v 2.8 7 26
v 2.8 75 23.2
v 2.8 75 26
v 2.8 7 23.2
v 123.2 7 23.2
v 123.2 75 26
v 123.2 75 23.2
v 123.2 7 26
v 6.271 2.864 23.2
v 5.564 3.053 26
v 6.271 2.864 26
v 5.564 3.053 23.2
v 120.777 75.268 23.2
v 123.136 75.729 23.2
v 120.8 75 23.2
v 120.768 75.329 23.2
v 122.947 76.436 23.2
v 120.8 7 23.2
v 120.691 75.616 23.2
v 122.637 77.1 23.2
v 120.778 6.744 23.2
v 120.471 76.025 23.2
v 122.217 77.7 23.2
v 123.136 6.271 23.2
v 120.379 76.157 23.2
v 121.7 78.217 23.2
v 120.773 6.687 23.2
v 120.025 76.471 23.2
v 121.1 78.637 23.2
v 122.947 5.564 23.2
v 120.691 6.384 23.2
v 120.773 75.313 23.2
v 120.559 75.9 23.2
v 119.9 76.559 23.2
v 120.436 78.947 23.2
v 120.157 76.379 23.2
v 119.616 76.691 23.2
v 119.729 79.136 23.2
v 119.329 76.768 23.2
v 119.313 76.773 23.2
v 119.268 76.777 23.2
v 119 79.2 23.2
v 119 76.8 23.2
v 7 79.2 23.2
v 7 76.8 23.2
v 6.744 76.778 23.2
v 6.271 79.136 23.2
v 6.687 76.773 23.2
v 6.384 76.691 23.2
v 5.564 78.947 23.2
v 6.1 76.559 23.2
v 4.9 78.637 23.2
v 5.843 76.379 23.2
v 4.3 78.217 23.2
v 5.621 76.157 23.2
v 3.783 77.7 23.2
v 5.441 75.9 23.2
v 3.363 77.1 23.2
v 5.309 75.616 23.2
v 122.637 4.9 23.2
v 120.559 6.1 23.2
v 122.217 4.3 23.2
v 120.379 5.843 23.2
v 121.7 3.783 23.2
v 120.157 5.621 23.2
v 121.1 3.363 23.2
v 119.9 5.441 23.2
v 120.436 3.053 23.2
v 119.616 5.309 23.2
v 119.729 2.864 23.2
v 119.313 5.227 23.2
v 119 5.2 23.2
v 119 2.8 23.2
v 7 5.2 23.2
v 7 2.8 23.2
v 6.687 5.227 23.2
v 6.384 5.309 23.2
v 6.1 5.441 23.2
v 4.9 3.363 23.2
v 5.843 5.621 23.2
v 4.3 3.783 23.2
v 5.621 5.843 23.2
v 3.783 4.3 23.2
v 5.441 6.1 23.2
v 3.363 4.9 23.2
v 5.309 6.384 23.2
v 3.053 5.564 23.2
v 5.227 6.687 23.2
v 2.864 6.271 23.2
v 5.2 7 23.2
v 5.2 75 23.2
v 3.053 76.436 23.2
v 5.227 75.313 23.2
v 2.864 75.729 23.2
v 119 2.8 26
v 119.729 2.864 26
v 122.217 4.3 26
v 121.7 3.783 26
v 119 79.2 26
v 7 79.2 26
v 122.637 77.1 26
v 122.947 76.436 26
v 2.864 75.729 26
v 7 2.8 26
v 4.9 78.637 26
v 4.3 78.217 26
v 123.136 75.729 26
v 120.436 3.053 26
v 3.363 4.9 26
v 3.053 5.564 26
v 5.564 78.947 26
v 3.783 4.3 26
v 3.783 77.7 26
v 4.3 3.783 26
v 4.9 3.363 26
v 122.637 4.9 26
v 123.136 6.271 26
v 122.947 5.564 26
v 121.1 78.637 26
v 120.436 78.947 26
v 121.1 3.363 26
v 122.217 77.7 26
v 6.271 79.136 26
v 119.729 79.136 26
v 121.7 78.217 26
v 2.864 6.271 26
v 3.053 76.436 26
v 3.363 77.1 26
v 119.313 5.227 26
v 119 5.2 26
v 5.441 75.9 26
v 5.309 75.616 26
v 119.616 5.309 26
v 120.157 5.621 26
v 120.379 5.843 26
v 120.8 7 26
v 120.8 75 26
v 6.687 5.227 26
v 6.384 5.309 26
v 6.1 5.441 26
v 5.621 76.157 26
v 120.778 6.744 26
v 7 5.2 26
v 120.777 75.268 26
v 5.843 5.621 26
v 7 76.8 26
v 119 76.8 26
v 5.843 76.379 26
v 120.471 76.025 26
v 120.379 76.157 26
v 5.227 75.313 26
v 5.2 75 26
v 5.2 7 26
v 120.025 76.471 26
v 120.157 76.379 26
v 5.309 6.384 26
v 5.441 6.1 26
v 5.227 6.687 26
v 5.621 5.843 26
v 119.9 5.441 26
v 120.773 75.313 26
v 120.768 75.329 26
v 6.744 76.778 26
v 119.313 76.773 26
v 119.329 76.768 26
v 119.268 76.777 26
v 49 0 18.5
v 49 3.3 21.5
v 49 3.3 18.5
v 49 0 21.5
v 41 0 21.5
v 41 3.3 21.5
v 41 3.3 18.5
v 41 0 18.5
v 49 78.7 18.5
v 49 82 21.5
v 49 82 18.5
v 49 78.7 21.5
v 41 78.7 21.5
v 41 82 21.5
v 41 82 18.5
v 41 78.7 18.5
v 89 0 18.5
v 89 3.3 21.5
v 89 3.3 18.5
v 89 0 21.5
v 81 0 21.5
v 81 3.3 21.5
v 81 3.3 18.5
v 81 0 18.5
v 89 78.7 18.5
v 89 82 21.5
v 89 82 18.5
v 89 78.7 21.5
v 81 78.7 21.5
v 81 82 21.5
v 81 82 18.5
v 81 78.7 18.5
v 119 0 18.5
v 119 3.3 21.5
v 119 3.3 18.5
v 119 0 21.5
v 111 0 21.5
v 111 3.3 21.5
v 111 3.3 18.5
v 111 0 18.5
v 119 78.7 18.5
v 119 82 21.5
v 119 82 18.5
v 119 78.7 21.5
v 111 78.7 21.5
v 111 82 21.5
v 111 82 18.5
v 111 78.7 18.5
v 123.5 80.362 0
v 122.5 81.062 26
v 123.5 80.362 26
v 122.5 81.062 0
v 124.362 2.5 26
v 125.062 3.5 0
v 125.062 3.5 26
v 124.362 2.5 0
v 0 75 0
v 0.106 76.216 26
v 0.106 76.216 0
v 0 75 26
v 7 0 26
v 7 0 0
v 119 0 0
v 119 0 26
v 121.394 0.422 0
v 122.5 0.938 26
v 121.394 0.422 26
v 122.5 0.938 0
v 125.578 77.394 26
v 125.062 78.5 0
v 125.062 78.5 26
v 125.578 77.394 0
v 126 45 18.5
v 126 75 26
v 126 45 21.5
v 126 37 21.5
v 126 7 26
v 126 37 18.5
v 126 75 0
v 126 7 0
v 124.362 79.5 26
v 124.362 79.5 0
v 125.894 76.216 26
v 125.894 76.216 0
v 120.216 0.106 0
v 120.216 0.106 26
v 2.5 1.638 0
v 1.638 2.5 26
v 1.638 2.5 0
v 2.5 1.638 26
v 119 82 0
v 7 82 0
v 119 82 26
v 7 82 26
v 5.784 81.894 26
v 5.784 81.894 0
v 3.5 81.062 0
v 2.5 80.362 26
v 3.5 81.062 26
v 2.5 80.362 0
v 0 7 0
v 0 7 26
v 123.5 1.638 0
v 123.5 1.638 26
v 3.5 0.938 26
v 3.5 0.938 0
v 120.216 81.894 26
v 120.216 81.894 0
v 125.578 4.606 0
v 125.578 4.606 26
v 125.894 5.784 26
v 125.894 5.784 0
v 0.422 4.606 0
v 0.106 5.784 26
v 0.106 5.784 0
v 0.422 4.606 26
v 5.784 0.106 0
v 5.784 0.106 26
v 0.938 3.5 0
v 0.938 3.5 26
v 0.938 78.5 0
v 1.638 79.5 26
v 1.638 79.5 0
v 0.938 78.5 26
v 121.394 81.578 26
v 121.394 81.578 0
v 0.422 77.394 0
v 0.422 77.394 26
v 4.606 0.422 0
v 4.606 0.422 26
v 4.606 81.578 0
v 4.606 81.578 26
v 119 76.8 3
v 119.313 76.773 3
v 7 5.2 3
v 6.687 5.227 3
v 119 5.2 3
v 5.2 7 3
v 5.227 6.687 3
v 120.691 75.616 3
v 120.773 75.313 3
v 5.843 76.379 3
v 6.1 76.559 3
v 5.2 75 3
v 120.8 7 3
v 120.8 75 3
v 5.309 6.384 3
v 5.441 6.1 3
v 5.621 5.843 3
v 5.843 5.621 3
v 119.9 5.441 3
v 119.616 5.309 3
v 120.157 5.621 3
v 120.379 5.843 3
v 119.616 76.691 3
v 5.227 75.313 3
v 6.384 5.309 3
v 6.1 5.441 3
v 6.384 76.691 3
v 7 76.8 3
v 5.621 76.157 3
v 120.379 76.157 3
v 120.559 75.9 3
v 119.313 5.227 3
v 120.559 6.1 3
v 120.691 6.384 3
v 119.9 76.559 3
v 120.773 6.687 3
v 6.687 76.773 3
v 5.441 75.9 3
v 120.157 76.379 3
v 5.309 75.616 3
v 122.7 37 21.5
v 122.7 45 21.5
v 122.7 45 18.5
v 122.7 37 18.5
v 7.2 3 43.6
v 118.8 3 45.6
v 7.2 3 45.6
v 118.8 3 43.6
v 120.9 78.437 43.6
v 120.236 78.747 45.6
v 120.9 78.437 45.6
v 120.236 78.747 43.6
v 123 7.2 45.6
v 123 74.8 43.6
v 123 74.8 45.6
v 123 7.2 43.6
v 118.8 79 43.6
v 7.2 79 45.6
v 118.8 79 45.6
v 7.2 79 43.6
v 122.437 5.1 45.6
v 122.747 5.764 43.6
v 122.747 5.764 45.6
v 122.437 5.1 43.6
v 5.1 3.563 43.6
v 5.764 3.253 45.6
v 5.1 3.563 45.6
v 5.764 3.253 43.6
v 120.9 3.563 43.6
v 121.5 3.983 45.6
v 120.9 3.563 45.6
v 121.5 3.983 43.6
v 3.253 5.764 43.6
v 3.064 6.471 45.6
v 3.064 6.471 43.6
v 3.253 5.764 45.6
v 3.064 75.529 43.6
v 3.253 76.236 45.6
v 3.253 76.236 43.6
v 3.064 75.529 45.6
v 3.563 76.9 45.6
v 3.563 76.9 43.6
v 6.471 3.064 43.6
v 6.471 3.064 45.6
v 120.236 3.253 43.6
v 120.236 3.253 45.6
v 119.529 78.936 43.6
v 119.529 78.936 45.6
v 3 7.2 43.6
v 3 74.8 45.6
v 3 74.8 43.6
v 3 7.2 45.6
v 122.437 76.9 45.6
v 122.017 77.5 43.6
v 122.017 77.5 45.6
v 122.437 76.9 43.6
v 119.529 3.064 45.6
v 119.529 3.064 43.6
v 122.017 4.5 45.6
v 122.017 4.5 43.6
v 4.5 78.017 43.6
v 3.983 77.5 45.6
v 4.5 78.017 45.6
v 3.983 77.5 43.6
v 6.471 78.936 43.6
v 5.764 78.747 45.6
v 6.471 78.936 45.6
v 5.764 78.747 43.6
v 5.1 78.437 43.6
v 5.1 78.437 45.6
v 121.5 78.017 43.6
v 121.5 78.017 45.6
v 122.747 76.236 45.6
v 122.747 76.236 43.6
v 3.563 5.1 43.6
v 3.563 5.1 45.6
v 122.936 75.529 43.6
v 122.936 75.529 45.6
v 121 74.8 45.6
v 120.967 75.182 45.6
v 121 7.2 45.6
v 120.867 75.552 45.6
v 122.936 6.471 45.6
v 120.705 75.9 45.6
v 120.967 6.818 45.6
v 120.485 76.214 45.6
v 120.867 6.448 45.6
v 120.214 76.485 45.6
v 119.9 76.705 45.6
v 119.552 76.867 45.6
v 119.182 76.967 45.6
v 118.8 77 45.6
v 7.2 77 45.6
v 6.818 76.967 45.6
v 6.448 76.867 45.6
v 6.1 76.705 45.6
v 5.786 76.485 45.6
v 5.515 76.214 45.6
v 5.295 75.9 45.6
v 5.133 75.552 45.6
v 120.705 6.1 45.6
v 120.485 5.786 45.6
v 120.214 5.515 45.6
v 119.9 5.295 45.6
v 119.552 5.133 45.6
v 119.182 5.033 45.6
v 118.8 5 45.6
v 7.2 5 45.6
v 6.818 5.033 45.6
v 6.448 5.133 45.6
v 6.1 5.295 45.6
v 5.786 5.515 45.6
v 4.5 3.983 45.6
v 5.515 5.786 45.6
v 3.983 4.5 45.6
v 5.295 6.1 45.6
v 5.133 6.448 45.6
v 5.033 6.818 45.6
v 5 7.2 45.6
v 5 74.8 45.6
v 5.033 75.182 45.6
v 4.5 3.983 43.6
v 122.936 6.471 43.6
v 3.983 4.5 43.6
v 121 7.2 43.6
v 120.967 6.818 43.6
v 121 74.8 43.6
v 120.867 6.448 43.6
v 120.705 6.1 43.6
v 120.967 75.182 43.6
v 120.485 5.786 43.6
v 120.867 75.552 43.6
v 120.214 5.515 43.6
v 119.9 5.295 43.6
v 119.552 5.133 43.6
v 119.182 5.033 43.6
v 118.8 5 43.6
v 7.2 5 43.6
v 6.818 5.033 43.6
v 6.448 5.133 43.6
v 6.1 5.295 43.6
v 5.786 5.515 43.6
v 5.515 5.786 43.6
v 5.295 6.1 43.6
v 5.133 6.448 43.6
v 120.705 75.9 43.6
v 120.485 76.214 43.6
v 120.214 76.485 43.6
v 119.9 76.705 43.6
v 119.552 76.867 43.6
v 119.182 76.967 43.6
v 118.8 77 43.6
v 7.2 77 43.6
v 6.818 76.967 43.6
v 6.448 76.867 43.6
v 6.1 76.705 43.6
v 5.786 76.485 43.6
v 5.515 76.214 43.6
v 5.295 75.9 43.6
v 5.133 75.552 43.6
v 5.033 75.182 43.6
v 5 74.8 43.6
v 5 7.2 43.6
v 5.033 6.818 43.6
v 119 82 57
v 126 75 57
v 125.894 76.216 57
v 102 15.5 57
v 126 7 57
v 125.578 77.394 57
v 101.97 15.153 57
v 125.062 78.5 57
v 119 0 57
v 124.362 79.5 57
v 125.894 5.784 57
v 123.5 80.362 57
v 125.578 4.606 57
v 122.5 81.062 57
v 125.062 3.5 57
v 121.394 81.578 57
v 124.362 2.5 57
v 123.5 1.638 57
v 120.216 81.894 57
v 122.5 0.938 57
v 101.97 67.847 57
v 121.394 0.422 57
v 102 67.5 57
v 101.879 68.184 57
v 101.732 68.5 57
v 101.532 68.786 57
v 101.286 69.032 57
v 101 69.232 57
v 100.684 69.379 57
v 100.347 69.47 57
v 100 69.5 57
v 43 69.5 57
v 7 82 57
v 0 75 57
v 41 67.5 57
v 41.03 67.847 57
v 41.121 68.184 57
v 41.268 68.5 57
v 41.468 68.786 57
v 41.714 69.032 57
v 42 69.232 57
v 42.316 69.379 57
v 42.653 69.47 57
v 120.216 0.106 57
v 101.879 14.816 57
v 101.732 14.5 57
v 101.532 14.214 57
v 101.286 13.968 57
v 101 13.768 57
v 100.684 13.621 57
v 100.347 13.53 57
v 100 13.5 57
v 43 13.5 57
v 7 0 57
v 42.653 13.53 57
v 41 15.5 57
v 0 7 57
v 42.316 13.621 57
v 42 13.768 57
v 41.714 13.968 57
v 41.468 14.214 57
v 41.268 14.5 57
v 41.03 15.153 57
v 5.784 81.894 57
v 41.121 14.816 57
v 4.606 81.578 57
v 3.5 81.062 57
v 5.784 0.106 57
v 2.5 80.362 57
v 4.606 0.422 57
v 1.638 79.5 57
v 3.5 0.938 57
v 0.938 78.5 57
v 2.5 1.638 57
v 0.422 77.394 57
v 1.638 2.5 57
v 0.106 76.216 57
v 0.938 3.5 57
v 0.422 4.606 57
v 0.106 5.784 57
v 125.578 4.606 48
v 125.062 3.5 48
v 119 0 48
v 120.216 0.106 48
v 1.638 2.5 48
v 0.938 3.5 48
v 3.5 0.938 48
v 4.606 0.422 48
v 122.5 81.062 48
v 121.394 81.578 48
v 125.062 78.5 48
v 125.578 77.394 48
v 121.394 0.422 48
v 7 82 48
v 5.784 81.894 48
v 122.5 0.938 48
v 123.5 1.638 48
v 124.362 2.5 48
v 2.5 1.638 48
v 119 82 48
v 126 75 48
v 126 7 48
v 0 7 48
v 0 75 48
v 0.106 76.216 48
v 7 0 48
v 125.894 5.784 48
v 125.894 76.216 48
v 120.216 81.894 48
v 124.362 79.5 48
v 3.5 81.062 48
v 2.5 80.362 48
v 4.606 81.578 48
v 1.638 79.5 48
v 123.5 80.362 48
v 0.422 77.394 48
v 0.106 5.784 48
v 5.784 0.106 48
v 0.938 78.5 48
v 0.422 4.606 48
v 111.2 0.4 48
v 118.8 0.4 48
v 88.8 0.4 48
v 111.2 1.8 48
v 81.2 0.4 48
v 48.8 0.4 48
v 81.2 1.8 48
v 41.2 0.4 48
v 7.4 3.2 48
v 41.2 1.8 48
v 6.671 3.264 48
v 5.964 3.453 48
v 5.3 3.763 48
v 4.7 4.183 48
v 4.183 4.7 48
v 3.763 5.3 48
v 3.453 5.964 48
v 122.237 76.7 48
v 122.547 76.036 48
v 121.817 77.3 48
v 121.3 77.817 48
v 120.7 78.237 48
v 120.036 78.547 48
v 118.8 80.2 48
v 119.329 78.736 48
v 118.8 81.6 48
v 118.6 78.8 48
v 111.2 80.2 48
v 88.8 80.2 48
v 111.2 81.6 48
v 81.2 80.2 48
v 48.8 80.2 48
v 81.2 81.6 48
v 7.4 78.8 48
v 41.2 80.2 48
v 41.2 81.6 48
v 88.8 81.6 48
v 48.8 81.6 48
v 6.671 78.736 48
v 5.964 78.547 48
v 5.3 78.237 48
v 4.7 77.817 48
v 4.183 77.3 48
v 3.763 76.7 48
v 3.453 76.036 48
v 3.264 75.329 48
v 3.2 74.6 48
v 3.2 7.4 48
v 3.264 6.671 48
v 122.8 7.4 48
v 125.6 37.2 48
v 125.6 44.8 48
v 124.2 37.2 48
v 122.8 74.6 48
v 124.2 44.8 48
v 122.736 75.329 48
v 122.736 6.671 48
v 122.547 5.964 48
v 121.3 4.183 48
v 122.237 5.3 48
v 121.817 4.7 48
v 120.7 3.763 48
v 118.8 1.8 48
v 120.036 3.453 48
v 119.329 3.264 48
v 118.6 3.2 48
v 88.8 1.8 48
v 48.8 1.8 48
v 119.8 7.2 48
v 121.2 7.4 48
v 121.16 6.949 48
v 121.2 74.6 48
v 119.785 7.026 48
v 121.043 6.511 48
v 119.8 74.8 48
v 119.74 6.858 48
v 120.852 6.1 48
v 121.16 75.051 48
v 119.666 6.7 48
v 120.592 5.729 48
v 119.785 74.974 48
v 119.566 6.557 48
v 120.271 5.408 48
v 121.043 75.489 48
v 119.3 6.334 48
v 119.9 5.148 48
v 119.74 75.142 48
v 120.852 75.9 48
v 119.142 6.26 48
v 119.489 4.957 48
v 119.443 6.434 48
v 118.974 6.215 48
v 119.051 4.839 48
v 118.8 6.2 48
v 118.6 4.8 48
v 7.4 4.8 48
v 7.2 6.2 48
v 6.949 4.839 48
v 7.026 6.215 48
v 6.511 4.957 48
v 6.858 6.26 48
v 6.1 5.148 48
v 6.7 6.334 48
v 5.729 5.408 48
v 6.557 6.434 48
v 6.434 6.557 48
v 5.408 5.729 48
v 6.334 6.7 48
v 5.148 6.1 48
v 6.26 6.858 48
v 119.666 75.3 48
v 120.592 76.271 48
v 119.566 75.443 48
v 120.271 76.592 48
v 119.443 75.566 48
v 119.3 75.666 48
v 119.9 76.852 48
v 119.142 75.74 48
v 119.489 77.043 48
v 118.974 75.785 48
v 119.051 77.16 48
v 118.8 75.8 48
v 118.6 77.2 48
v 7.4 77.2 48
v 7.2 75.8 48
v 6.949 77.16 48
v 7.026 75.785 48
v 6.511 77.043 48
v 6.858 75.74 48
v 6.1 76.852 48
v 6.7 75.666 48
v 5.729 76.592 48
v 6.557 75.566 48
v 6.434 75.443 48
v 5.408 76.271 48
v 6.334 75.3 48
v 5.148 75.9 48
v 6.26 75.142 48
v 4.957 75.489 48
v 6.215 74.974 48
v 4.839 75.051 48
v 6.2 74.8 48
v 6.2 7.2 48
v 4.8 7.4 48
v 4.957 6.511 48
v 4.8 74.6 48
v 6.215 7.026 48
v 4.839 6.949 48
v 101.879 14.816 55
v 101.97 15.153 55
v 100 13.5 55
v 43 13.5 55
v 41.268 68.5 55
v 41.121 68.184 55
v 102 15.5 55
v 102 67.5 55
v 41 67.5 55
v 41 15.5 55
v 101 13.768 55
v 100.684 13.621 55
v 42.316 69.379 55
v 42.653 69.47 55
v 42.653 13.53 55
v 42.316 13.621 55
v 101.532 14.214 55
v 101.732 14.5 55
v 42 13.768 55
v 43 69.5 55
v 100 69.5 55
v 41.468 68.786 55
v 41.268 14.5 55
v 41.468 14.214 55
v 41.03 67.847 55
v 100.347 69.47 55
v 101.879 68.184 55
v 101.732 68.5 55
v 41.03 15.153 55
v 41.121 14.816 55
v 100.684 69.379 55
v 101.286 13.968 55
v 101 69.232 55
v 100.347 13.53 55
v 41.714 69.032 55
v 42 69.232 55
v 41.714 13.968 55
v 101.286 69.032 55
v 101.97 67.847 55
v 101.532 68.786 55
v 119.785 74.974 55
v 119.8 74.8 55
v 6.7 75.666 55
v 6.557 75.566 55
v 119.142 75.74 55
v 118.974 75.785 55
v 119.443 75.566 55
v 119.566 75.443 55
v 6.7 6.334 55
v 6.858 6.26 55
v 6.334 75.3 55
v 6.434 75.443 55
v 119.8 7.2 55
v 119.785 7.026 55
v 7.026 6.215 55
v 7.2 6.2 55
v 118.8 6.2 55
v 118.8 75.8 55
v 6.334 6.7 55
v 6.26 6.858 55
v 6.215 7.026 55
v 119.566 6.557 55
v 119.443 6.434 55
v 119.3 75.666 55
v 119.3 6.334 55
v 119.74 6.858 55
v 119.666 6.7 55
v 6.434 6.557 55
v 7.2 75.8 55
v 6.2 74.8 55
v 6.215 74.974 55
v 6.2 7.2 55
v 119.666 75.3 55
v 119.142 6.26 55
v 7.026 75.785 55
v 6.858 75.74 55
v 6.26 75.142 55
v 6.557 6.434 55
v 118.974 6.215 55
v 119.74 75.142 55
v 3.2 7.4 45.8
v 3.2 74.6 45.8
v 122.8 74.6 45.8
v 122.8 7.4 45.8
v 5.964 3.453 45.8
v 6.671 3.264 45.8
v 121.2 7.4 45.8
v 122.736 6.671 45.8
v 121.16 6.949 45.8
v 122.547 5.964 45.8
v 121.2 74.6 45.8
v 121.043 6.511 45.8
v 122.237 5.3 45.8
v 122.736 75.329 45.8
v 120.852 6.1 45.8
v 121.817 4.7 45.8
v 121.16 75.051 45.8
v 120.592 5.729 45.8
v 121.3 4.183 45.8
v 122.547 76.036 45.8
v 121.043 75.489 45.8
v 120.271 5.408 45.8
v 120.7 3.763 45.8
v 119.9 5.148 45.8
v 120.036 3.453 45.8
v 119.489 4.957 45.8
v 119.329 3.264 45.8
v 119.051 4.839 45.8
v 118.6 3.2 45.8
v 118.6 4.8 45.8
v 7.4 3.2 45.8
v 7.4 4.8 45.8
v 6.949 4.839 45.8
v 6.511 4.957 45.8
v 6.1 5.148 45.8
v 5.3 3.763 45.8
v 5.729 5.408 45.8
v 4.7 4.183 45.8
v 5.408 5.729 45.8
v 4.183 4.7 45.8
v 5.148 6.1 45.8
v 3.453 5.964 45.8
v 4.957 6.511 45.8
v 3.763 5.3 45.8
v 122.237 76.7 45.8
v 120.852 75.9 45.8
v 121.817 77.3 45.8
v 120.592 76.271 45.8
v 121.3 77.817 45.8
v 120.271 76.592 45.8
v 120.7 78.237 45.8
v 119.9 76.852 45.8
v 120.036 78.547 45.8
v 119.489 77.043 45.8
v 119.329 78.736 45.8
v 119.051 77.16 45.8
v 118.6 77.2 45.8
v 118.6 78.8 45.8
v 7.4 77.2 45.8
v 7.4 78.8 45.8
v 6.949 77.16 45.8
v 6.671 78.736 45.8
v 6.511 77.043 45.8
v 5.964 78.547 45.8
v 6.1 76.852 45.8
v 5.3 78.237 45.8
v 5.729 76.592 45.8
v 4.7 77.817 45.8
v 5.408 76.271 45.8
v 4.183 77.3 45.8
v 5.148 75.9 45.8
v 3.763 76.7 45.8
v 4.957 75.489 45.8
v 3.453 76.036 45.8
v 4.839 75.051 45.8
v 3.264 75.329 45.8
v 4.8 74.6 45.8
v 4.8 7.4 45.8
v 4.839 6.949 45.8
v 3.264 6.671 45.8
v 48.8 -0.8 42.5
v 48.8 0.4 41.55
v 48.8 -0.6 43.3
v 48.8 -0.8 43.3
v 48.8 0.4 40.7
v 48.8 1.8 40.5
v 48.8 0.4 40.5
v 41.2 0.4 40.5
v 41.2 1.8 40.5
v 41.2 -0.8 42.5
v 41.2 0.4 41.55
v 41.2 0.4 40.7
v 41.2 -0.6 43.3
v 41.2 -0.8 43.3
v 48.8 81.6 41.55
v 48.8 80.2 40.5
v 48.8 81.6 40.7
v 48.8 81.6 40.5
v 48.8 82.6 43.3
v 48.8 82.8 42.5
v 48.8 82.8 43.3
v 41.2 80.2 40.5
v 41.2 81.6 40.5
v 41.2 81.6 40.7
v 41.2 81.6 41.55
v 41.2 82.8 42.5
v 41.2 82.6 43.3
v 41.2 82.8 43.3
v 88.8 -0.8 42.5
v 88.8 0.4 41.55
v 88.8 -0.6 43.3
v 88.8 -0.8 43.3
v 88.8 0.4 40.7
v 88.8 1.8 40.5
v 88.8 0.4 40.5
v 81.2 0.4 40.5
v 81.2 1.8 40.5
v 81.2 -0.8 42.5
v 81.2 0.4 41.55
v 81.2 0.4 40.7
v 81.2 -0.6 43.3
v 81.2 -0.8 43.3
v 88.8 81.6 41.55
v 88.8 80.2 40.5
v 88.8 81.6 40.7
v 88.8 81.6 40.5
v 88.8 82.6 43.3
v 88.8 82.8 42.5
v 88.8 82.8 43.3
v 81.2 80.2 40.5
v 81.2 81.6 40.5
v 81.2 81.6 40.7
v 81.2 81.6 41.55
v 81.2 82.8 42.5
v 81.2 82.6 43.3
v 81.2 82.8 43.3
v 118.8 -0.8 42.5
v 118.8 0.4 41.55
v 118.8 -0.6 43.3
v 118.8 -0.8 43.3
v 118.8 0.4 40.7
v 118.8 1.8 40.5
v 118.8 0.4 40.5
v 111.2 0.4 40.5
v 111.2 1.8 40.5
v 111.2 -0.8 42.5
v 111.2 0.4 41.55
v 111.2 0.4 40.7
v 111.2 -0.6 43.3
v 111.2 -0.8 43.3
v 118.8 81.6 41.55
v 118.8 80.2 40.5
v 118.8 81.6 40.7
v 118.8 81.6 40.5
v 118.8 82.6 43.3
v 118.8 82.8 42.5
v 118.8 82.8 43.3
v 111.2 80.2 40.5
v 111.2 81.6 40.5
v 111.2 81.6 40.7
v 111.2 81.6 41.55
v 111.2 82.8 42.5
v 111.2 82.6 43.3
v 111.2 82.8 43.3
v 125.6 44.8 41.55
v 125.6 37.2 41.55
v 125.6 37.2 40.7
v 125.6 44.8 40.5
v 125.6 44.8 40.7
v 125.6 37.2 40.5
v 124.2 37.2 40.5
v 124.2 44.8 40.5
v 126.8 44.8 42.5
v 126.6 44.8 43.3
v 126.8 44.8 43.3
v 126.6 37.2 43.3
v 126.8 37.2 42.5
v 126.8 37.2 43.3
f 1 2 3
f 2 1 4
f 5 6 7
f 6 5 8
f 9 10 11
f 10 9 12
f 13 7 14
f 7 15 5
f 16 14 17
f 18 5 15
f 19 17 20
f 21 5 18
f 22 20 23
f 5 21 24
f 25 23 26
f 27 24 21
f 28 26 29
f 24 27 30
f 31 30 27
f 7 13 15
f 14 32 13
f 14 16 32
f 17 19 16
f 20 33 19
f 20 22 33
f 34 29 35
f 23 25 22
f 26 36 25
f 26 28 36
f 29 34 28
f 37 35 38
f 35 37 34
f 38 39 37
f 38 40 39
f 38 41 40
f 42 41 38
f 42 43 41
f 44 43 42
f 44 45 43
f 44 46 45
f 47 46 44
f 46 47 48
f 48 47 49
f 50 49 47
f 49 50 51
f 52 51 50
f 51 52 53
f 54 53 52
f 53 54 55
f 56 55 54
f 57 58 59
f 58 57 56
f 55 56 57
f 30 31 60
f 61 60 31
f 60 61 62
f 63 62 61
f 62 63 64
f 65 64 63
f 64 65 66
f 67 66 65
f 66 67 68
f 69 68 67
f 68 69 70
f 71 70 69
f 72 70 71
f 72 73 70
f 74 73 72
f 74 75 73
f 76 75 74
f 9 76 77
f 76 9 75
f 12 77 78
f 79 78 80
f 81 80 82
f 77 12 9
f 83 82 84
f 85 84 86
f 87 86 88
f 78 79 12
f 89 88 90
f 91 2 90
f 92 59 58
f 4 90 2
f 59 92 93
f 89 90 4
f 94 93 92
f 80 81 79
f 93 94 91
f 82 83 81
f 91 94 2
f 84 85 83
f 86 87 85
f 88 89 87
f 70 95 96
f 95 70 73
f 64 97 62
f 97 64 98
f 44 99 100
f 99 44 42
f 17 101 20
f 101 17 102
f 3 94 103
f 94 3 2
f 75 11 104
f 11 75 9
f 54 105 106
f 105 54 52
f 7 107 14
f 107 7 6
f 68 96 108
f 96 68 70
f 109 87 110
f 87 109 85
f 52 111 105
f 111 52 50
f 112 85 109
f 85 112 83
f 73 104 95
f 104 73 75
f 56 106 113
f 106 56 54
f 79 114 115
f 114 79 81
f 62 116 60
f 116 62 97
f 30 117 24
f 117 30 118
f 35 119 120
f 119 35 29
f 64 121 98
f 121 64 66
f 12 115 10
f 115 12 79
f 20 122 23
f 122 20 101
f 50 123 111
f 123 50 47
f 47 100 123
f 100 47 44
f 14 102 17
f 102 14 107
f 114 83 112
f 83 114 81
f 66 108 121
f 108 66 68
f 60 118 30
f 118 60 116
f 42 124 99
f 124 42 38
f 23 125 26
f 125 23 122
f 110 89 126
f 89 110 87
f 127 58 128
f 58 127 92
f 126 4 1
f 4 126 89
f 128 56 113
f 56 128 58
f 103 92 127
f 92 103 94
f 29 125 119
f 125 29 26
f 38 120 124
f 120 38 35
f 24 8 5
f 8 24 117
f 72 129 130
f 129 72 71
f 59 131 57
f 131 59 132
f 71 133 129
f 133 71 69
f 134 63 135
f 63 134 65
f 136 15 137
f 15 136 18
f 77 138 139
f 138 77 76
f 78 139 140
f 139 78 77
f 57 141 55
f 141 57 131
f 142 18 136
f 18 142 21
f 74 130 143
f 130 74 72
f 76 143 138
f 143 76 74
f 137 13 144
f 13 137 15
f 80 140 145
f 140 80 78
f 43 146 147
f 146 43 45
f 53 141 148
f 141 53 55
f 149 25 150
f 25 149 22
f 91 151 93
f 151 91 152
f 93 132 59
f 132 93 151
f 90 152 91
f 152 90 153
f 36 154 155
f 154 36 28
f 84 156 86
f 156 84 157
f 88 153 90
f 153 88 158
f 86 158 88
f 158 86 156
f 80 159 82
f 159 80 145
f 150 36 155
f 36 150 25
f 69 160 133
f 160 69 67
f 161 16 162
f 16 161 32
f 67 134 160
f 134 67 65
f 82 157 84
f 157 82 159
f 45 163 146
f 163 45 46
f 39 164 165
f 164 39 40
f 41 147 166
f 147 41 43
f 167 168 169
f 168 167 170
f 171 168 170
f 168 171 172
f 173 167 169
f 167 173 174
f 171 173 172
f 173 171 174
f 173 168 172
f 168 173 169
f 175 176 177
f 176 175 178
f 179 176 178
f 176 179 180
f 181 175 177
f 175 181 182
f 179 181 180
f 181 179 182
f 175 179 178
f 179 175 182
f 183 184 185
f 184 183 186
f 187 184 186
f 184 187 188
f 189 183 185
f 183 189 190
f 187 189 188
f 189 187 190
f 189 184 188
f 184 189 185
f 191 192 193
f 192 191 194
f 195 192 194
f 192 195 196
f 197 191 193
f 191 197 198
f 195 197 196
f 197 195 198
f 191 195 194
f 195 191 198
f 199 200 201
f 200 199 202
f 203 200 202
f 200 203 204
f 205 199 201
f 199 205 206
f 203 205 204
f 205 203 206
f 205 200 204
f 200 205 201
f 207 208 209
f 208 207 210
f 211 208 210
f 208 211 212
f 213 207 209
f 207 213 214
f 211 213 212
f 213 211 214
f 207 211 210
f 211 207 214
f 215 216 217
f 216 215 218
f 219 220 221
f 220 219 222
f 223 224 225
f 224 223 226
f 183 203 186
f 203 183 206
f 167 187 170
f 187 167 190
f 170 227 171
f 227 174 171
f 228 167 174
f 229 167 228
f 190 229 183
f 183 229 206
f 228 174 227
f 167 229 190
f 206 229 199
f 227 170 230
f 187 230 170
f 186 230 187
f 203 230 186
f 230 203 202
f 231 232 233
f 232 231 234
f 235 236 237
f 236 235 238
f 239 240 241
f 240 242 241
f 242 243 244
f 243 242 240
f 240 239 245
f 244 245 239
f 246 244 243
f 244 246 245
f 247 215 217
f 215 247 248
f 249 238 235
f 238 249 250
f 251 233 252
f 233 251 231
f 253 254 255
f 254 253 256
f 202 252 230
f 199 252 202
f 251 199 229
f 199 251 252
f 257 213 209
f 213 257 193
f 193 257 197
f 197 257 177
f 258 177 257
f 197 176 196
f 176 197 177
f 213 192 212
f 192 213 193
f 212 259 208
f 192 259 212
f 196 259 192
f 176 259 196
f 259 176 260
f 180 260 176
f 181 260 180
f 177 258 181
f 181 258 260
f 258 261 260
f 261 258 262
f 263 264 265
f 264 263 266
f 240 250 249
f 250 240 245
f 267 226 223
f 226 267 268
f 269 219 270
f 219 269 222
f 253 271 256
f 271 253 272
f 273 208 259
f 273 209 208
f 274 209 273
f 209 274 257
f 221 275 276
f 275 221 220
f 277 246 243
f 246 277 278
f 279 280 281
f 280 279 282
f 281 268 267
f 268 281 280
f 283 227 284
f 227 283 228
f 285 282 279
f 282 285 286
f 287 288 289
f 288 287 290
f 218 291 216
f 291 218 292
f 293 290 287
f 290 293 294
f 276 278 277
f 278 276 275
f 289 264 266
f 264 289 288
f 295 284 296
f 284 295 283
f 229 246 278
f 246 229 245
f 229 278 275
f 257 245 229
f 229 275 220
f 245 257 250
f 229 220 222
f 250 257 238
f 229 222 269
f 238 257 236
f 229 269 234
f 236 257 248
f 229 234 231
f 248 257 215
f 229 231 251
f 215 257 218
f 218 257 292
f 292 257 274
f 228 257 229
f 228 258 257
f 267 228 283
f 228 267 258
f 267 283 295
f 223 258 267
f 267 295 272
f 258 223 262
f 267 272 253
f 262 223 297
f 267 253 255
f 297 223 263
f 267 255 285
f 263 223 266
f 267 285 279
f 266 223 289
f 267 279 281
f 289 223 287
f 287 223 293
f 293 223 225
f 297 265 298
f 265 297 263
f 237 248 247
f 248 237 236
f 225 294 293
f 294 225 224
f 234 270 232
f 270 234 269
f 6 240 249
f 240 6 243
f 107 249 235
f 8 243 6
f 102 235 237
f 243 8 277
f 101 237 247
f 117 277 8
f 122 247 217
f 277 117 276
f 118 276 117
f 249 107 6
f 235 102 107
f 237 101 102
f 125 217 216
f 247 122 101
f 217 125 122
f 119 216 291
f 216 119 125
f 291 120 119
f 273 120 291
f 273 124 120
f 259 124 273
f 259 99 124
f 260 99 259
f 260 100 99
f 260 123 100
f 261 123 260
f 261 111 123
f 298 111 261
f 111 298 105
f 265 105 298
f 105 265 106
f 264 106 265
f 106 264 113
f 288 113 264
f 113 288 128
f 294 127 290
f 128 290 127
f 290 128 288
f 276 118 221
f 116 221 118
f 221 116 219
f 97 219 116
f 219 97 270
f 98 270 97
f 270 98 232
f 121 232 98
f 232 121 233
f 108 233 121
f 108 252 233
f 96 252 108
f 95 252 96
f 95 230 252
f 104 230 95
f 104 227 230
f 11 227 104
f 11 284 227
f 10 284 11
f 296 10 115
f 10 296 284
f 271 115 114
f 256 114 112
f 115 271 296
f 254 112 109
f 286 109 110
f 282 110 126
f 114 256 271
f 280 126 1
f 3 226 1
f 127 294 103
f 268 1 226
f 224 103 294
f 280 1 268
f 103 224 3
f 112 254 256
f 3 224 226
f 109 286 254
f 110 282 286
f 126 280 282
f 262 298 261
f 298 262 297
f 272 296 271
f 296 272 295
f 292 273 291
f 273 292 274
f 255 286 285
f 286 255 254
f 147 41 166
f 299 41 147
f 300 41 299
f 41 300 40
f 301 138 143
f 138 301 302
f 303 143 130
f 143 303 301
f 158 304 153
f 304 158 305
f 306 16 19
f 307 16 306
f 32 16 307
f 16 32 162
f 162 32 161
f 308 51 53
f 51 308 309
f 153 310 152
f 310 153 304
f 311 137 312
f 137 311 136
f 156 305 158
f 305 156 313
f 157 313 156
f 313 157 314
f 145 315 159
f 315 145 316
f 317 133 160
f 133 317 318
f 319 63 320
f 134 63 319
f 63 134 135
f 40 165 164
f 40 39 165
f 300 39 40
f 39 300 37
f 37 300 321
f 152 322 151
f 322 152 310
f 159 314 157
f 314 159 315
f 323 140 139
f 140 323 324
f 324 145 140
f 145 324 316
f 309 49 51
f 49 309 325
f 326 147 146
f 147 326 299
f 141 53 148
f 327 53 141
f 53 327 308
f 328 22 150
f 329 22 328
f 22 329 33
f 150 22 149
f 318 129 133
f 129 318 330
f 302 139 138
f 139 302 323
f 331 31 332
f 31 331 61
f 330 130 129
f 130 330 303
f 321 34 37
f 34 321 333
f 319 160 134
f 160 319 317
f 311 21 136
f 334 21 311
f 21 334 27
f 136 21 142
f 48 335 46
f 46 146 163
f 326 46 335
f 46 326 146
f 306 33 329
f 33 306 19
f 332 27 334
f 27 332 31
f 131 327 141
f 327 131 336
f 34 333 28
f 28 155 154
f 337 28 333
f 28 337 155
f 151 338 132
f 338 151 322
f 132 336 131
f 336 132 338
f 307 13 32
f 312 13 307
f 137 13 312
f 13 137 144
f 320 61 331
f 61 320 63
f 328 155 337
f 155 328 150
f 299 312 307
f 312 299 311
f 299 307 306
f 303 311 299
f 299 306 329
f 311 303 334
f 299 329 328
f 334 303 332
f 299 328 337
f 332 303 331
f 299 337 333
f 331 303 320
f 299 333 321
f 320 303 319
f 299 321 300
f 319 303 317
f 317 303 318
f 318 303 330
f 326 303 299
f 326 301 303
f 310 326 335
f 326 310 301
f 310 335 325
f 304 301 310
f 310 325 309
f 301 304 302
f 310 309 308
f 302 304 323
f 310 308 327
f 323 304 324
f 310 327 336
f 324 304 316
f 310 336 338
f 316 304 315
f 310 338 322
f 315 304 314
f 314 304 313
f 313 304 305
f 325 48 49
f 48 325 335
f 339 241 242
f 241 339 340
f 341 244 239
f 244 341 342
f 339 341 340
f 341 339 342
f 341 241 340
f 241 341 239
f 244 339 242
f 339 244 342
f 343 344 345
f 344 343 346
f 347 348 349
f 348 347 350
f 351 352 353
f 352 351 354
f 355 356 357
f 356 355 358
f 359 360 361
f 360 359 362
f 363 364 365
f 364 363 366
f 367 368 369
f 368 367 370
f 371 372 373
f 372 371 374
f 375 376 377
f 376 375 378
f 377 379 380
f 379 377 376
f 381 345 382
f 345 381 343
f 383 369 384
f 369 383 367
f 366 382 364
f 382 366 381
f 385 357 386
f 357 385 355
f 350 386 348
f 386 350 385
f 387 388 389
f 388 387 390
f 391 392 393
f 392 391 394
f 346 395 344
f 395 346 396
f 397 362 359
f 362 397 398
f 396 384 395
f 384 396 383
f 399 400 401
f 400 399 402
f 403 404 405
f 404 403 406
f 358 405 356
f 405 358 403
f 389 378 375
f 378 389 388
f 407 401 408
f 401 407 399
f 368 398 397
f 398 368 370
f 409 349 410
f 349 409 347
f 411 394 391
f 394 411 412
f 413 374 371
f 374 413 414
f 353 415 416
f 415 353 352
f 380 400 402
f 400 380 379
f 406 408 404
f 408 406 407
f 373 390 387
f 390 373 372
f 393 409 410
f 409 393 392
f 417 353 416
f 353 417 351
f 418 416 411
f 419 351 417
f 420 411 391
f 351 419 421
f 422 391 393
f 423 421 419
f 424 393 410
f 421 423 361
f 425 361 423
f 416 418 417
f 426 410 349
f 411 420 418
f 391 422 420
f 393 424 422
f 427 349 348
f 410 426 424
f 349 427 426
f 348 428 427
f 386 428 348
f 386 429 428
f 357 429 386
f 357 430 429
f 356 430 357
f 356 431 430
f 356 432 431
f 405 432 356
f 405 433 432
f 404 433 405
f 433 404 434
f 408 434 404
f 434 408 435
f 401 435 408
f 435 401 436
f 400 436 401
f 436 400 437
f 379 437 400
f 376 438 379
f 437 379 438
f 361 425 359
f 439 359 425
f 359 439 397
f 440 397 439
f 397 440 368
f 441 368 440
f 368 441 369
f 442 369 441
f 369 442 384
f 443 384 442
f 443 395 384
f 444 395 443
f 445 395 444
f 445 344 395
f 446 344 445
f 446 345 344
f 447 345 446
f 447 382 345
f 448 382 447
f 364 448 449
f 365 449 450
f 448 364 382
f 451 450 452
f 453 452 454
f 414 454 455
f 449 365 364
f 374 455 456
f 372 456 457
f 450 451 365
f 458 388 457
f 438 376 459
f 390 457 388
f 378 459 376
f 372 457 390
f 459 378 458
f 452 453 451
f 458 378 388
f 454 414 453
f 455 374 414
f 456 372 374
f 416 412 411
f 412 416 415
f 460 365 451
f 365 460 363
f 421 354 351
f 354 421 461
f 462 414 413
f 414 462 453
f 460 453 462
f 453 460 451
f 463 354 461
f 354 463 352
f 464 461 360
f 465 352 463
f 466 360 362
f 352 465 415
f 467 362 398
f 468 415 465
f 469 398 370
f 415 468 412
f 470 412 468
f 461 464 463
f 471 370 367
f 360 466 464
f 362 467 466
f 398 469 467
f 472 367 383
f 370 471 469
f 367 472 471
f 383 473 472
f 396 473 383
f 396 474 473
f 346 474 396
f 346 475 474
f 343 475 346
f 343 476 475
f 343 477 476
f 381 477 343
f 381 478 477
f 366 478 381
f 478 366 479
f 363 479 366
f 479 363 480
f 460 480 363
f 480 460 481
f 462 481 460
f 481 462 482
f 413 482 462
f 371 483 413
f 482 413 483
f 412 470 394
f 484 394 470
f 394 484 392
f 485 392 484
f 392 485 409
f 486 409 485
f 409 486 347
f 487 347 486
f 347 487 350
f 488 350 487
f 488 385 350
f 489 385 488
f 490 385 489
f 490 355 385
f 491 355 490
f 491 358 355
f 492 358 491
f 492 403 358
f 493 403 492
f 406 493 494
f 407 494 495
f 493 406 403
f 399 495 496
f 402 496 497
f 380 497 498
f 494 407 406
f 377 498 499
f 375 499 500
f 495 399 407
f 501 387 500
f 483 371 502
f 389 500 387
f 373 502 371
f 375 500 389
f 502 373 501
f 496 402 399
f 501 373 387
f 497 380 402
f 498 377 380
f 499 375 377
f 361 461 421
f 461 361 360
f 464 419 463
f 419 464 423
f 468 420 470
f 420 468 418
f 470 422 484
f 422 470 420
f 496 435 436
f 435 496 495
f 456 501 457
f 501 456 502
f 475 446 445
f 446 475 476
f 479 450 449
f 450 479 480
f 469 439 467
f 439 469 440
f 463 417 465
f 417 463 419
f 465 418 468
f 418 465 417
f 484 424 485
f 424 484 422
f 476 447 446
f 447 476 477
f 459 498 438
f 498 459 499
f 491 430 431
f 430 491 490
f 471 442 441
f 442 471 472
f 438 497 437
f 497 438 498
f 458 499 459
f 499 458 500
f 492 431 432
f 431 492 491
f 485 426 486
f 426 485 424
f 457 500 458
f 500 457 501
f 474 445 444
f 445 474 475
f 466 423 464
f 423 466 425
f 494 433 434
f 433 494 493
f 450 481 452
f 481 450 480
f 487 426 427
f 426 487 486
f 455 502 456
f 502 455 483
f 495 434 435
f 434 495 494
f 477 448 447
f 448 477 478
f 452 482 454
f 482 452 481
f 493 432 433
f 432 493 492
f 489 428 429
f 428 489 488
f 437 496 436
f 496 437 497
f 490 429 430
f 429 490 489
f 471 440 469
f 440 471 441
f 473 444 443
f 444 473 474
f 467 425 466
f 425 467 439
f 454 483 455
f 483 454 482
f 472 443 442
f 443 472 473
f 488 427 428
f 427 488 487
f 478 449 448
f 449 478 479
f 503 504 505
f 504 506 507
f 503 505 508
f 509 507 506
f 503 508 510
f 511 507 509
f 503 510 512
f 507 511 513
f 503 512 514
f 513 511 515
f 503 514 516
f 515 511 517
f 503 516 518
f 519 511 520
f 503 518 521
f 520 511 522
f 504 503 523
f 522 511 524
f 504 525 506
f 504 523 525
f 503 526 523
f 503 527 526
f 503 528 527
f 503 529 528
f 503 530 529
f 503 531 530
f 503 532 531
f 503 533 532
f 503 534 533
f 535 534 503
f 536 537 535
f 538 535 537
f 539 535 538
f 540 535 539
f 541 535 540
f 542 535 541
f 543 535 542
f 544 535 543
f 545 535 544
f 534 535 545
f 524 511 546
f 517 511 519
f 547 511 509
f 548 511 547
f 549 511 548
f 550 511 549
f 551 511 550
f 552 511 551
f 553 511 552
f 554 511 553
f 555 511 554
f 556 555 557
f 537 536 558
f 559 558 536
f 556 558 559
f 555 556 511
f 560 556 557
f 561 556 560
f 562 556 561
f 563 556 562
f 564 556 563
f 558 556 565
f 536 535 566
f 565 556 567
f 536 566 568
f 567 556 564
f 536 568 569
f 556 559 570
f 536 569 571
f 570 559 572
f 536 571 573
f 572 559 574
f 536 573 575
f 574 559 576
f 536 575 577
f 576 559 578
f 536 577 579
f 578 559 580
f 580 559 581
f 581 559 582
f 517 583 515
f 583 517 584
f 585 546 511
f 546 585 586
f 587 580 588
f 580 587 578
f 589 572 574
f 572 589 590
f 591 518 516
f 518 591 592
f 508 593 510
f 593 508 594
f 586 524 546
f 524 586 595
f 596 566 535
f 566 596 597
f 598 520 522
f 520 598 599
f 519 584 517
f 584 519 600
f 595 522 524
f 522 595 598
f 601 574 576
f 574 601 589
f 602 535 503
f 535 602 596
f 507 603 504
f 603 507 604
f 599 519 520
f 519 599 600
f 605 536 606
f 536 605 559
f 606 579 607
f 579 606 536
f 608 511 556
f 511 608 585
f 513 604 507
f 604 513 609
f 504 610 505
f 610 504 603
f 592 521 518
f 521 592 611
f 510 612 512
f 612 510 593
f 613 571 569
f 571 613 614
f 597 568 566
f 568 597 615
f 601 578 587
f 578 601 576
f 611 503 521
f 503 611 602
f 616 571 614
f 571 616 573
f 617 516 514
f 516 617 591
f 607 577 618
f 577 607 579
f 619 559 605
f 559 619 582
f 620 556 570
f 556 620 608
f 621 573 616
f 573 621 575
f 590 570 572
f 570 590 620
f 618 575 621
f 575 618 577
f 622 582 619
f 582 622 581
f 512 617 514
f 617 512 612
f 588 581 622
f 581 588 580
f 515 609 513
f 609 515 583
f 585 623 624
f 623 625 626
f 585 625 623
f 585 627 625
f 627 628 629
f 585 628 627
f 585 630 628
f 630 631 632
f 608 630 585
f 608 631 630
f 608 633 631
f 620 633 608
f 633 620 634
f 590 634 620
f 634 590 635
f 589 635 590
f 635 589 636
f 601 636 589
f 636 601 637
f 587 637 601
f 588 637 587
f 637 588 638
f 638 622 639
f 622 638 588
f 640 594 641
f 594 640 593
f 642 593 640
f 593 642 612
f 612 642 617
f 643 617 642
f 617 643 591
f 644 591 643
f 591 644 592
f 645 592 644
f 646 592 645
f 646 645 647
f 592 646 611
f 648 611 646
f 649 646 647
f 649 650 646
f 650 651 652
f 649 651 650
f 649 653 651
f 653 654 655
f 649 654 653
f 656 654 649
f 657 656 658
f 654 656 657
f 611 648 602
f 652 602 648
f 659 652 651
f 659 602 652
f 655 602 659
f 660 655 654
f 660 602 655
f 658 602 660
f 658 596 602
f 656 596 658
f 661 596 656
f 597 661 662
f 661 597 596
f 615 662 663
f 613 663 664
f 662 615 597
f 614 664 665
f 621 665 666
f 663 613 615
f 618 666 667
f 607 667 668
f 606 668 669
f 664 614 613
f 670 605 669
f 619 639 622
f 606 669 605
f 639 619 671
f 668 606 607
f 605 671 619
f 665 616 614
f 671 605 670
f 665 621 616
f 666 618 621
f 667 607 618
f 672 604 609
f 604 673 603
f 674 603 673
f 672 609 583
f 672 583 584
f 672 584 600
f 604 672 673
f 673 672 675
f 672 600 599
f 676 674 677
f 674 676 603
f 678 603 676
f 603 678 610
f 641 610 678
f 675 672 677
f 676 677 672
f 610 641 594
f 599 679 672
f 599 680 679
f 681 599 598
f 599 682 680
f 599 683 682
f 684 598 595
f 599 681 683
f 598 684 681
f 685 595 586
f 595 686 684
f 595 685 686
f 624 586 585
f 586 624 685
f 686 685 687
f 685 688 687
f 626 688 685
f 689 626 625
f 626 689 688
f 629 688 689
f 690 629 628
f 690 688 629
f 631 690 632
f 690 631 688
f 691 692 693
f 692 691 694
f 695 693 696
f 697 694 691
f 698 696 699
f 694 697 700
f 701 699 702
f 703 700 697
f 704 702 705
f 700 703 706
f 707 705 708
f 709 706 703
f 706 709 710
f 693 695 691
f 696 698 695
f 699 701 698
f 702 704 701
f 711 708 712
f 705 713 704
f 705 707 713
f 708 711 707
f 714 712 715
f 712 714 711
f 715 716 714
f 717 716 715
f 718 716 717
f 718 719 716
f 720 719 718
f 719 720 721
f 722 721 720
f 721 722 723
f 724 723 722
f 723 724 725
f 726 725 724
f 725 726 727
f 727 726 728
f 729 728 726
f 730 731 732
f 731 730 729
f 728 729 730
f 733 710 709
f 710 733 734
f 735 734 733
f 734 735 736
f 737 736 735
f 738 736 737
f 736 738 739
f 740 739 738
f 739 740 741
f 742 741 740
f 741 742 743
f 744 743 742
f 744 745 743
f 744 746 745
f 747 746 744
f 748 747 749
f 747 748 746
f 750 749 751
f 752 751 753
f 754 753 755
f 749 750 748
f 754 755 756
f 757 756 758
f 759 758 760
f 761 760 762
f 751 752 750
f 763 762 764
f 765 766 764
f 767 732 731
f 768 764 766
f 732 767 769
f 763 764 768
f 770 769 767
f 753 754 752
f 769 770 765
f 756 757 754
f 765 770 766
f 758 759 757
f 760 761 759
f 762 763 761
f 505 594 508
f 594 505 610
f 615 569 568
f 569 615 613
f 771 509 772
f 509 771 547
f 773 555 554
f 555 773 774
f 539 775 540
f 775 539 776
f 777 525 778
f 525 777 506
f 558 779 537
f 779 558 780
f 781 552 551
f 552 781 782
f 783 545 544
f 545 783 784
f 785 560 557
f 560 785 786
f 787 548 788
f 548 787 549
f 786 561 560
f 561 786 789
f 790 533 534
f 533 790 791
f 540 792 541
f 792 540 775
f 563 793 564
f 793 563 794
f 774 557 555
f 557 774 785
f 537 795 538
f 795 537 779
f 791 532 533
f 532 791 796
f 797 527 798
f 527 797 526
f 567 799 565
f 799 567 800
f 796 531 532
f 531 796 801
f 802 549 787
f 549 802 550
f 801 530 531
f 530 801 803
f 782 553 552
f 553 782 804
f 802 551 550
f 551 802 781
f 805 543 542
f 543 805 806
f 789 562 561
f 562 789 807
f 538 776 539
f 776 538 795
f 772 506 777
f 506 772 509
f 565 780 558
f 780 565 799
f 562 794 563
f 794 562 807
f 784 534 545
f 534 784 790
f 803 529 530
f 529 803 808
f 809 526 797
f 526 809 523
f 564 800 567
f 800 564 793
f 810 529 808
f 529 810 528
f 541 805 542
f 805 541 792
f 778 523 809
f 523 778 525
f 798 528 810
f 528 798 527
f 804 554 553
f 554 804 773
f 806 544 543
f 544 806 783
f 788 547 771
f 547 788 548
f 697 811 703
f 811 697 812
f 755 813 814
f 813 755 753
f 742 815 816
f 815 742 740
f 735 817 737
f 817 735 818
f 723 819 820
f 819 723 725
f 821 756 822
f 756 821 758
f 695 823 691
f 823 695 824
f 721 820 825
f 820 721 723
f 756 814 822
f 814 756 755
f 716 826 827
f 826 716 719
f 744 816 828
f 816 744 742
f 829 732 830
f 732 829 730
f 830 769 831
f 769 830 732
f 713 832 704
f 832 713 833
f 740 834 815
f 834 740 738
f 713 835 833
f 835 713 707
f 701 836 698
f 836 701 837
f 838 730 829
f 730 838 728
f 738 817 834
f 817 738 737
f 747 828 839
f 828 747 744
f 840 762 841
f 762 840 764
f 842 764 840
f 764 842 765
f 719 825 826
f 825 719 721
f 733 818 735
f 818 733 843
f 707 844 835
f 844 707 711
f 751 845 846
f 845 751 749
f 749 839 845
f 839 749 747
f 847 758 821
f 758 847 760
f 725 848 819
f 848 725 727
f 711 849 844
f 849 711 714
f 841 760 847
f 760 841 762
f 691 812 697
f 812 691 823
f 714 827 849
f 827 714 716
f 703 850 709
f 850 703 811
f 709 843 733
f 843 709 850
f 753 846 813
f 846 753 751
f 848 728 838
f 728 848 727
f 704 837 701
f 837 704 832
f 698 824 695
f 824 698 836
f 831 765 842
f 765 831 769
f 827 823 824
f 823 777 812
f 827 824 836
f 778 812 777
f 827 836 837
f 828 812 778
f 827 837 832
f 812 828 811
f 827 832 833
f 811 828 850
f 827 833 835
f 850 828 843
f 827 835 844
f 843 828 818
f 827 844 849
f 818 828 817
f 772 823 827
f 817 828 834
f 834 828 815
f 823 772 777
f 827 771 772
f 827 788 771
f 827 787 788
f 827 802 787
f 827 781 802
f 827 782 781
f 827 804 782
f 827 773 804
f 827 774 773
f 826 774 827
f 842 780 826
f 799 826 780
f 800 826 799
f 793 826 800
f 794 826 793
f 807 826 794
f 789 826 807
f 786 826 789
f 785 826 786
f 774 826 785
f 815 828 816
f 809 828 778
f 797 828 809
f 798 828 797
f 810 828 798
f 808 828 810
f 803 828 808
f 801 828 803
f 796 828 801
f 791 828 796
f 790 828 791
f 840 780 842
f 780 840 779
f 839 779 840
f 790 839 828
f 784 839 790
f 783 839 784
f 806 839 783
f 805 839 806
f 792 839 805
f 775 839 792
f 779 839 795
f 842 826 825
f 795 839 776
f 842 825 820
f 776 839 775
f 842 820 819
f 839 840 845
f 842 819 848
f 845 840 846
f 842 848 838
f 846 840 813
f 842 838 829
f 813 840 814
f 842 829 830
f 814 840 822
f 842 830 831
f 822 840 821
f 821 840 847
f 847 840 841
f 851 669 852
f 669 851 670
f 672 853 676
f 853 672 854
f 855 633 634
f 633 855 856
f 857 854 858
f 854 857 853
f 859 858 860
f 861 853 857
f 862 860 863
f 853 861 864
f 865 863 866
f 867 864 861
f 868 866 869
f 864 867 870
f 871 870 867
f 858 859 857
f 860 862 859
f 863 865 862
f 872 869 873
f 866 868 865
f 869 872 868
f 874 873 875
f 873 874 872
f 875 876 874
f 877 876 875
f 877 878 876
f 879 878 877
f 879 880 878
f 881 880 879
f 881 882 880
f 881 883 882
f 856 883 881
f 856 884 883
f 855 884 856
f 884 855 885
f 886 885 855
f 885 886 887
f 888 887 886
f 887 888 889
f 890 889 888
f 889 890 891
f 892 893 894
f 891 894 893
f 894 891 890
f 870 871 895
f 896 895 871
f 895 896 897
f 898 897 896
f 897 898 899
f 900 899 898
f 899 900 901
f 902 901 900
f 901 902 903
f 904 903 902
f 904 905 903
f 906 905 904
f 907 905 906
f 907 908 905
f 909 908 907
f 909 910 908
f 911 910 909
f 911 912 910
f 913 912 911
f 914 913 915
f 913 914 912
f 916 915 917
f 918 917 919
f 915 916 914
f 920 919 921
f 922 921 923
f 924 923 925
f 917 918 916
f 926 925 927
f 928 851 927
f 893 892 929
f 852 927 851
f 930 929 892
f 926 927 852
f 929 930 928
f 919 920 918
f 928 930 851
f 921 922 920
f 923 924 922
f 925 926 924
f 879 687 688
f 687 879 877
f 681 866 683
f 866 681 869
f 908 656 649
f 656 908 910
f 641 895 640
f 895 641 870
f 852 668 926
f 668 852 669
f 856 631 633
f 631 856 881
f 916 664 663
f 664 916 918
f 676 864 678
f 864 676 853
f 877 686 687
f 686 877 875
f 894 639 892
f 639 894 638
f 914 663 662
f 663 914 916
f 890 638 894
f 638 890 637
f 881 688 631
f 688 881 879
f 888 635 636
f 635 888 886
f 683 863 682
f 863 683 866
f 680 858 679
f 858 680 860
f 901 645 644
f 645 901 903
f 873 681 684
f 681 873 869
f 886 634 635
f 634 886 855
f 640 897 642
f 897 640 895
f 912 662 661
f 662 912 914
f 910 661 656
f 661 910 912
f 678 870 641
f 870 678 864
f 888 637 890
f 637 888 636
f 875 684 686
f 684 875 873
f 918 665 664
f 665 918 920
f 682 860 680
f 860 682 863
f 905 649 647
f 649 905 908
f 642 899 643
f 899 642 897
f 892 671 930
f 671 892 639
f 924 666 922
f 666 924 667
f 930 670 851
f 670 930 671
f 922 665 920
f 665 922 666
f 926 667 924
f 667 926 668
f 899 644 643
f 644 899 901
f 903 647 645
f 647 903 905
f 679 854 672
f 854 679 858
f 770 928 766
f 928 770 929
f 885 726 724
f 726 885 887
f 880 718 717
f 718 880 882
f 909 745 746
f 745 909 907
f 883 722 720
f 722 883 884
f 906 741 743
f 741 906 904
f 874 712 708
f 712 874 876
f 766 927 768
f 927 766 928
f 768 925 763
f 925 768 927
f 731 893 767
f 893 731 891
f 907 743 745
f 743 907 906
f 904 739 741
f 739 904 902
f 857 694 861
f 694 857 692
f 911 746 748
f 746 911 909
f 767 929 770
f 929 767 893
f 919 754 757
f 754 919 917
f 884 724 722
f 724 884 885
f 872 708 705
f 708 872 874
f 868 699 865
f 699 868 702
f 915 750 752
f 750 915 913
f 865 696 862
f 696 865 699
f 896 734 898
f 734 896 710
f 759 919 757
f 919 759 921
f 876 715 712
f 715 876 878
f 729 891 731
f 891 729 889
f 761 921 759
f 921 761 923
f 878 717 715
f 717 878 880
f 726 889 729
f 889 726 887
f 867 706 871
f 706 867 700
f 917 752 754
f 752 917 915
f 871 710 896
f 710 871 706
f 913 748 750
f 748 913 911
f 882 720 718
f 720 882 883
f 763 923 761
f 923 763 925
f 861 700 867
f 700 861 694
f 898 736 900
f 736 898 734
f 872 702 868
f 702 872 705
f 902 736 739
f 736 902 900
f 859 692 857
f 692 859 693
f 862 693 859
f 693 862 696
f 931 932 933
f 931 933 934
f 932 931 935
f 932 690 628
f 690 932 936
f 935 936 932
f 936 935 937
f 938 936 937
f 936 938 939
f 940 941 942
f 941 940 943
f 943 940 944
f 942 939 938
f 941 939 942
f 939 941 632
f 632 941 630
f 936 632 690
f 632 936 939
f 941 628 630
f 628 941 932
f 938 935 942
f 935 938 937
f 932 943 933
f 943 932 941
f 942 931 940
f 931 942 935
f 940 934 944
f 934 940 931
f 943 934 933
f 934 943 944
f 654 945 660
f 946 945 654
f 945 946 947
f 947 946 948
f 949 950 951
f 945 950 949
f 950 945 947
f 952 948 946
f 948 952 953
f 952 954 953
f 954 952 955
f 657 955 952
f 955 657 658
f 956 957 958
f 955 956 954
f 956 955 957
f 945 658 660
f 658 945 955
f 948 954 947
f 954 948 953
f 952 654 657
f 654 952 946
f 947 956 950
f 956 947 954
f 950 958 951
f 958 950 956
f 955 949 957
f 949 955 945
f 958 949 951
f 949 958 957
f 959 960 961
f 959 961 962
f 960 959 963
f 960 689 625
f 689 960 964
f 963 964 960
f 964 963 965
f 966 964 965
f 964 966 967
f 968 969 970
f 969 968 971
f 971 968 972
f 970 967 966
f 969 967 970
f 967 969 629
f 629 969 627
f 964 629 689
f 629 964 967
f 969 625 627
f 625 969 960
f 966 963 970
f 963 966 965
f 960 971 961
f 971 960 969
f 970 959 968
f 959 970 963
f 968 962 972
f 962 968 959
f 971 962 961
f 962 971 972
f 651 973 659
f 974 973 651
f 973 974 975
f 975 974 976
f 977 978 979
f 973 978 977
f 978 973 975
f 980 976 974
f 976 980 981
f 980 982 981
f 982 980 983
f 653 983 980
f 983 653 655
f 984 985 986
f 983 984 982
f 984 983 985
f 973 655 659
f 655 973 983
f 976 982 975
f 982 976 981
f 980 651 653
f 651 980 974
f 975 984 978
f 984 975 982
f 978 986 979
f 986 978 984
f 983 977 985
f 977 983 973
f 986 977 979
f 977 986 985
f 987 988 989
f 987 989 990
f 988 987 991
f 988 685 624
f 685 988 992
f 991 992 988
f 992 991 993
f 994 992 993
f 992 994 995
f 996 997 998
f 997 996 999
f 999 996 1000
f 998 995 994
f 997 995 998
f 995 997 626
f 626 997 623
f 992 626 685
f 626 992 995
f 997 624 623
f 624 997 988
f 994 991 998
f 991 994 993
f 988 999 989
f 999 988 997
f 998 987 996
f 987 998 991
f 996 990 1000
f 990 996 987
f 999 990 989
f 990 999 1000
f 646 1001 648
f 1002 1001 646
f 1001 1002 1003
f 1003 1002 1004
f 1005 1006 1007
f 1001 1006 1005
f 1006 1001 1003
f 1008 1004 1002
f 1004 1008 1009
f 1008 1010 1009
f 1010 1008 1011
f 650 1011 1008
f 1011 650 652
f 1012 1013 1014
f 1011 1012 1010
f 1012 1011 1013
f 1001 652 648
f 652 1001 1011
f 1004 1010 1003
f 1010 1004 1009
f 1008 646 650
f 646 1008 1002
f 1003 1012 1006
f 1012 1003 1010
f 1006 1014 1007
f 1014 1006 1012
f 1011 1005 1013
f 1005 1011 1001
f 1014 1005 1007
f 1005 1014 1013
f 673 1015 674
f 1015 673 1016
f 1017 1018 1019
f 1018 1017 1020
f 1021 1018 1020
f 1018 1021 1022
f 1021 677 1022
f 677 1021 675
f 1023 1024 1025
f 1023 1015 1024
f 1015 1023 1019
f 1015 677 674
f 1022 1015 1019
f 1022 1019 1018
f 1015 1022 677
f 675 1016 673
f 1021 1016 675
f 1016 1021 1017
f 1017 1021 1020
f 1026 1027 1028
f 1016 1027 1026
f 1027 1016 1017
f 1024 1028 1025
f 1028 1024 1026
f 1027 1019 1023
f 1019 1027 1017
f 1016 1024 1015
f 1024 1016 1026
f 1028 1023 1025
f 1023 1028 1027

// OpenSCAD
$fn = 36;

pod_l = 126.0;
pod_w = 82.0;
pod_base_h = 26.0;
lid_h = 9.0;
pod_r = 7.0;
pod_wall = 2.8;

// U-channel & tongue IP67 parameters
u_w = 2.4;
u_d = 2.8;
tongue_w = 1.6;
tongue_h = 2.2;
gasket_w = 2.0;
gasket_t = 2.0;

// Cantilever snap clips
clip_w = 8.0;
clip_t = 1.4;
clip_arm_h = 7.5;
hook_d = 1.2;

// Posiciones de los clips perimetrales (X para laterales, Y para extremos)
clip_x_positions = [45.0, 85.0, 115.0]; // 3 clips a cada lado largo
clip_y_end = pod_w / 2;                 // 1 clip en el extremo trasero

module r_box(l, w, h, r) {
    hull() {
        translate([r, r, 0]) cylinder(r=r, h=h);
        translate([l-r, r, 0]) cylinder(r=r, h=h);
        translate([r, w-r, 0]) cylinder(r=r, h=h);
        translate([l-r, w-r, 0]) cylinder(r=r, h=h);
    }
}

// 1. CARCASA BASE CON CANAL EN U Y VENTANAS DE CLICK
module test_base() {
    difference() {
        // Cuerpo exterior
        r_box(pod_l, pod_w, pod_base_h, pod_r);

        // Vaciado interior
        translate([pod_wall + u_w, pod_wall + u_w, 3.0])
            r_box(pod_l - 2*(pod_wall + u_w), pod_w - 2*(pod_wall + u_w), pod_base_h, max(1, pod_r - pod_wall - u_w));

        // Canal laberíntico continuo en U para junta tórica IP67
        translate([pod_wall, pod_wall, pod_base_h - u_d]) {
            difference() {
                r_box(pod_l - 2*pod_wall, pod_w - 2*pod_wall, u_d + 1, max(1, pod_r - pod_wall));
                translate([u_w, u_w, -0.5])
                    r_box(pod_l - 2*(pod_wall + u_w), pod_w - 2*(pod_wall + u_w), u_d + 2, max(1, pod_r - pod_wall - u_w));
            }
        }

        // Ventanas de click en laterales Y=0 y Y=pod_w
        for (cx = clip_x_positions) {
            // Lado Y=0
            translate([cx - clip_w/2, -0.5, pod_base_h - clip_arm_h])
                cube([clip_w, pod_wall + 1.0, 3.0]);
            // Lado Y=pod_w
            translate([cx - clip_w/2, pod_w - pod_wall - 0.5, pod_base_h - clip_arm_h])
                cube([clip_w, pod_wall + 1.0, 3.0]);
        }

        // Ventana de click en extremo trasero X=pod_l
        translate([pod_l - pod_wall - 0.5, clip_y_end - clip_w/2, pod_base_h - clip_arm_h])
            cube([pod_wall + 1.0, clip_w, 3.0]);
    }
}

// 2. TAPA CON LENGÜETA DE COMPRESIÓN Y CLIPS SNAP-FIT
module test_lid() {
    union() {
        // Marco/tapa superior
        difference() {
            r_box(pod_l, pod_w, lid_h, pod_r);
            // Cuna para panel solar
            translate([(pod_l - 60)/2 + 8, (pod_w - 55)/2, lid_h - 2.2])
                r_box(61, 56, 3, 2);
            // Vaciado interior
            translate([pod_wall + u_w + 1, pod_wall + u_w + 1, -1])
                r_box(pod_l - 2*(pod_wall + u_w + 1), pod_w - 2*(pod_wall + u_w + 1), lid_h - 1, max(1, pod_r - pod_wall - u_w - 1));
        }

        // Lengüeta perimetral de compresión que baja hacia el canal en U
        translate([pod_wall + (u_w - tongue_w)/2, pod_wall + (u_w - tongue_w)/2, -tongue_h]) {
            difference() {
                r_box(pod_l - 2*(pod_wall + (u_w - tongue_w)/2), pod_w - 2*(pod_wall + (u_w - tongue_w)/2), tongue_h + 0.1, max(1, pod_r - pod_wall));
                translate([tongue_w, tongue_w, -0.5])
                    r_box(pod_l - 2*(pod_wall + (u_w - tongue_w)/2 + tongue_w), pod_w - 2*(pod_wall + (u_w - tongue_w)/2 + tongue_w), tongue_h + 1.2, max(1, pod_r - pod_wall - tongue_w));
            }
        }

        // Brazos con ganchos de traba (Snap-Fit Hooks)
        // Laterales Y=0 y Y=pod_w
        for (cx = clip_x_positions) {
            // Lado Y=0
            translate([cx - clip_w/2 + 0.2, 0.4, -clip_arm_h]) {
                cube([clip_w - 0.4, clip_t, clip_arm_h]);
                // Gancho en cuña (rampa 30° hacia abajo, tope 90° arriba)
                hull() {
                    translate([0, 0, 0.2]) cube([clip_w - 0.4, 0.2, 0.5]);
                    translate([0, -hook_d, 2.0]) cube([clip_w - 0.4, 0.2, 0.8]);
                }
            }
            // Lado Y=pod_w
            translate([cx - clip_w/2 + 0.2, pod_w - clip_t - 0.4, -clip_arm_h]) {
                cube([clip_w - 0.4, clip_t, clip_arm_h]);
                hull() {
                    translate([0, clip_t - 0.2, 0.2]) cube([clip_w - 0.4, 0.2, 0.5]);
                    translate([0, clip_t + hook_d - 0.2, 2.0]) cube([clip_w - 0.4, 0.2, 0.8]);
                }
            }
        }

        // Extremo trasero X=pod_l
        translate([pod_l - clip_t - 0.4, clip_y_end - clip_w/2 + 0.2, -clip_arm_h]) {
            cube([clip_t, clip_w - 0.4, clip_arm_h]);
            hull() {
                translate([clip_t - 0.2, 0, 0.2]) cube([0.2, clip_w - 0.4, 0.5]);
                translate([clip_t + hook_d - 0.2, 0, 2.0]) cube([0.2, clip_w - 0.4, 0.8]);
            }
        }
    }
}

// 3. JUNTA TÓRICA ELASTOMÉRICA IP67
module test_gasket() {
    color([0.95, 0.40, 0.10, 0.8]) {
        translate([pod_wall + (u_w - gasket_w)/2, pod_wall + (u_w - gasket_w)/2, pod_base_h - u_d + 0.4]) {
            difference() {
                r_box(pod_l - 2*(pod_wall + (u_w - gasket_w)/2), pod_w - 2*(pod_wall + (u_w - gasket_w)/2), gasket_t, max(1, pod_r - pod_wall));
                translate([gasket_w, gasket_w, -0.5])
                    r_box(pod_l - 2*(pod_wall + (u_w - gasket_w)/2 + gasket_w), pod_w - 2*(pod_wall + (u_w - gasket_w)/2 + gasket_w), gasket_t + 1.0, max(1, pod_r - pod_wall - gasket_w));
            }
        }
    }
}

// Vista explosionada
color([0.94, 0.42, 0.12]) test_base();
translate([0, 0, 20]) test_gasket();
translate([0, 0, 48]) color([0.94, 0.42, 0.12]) test_lid();
